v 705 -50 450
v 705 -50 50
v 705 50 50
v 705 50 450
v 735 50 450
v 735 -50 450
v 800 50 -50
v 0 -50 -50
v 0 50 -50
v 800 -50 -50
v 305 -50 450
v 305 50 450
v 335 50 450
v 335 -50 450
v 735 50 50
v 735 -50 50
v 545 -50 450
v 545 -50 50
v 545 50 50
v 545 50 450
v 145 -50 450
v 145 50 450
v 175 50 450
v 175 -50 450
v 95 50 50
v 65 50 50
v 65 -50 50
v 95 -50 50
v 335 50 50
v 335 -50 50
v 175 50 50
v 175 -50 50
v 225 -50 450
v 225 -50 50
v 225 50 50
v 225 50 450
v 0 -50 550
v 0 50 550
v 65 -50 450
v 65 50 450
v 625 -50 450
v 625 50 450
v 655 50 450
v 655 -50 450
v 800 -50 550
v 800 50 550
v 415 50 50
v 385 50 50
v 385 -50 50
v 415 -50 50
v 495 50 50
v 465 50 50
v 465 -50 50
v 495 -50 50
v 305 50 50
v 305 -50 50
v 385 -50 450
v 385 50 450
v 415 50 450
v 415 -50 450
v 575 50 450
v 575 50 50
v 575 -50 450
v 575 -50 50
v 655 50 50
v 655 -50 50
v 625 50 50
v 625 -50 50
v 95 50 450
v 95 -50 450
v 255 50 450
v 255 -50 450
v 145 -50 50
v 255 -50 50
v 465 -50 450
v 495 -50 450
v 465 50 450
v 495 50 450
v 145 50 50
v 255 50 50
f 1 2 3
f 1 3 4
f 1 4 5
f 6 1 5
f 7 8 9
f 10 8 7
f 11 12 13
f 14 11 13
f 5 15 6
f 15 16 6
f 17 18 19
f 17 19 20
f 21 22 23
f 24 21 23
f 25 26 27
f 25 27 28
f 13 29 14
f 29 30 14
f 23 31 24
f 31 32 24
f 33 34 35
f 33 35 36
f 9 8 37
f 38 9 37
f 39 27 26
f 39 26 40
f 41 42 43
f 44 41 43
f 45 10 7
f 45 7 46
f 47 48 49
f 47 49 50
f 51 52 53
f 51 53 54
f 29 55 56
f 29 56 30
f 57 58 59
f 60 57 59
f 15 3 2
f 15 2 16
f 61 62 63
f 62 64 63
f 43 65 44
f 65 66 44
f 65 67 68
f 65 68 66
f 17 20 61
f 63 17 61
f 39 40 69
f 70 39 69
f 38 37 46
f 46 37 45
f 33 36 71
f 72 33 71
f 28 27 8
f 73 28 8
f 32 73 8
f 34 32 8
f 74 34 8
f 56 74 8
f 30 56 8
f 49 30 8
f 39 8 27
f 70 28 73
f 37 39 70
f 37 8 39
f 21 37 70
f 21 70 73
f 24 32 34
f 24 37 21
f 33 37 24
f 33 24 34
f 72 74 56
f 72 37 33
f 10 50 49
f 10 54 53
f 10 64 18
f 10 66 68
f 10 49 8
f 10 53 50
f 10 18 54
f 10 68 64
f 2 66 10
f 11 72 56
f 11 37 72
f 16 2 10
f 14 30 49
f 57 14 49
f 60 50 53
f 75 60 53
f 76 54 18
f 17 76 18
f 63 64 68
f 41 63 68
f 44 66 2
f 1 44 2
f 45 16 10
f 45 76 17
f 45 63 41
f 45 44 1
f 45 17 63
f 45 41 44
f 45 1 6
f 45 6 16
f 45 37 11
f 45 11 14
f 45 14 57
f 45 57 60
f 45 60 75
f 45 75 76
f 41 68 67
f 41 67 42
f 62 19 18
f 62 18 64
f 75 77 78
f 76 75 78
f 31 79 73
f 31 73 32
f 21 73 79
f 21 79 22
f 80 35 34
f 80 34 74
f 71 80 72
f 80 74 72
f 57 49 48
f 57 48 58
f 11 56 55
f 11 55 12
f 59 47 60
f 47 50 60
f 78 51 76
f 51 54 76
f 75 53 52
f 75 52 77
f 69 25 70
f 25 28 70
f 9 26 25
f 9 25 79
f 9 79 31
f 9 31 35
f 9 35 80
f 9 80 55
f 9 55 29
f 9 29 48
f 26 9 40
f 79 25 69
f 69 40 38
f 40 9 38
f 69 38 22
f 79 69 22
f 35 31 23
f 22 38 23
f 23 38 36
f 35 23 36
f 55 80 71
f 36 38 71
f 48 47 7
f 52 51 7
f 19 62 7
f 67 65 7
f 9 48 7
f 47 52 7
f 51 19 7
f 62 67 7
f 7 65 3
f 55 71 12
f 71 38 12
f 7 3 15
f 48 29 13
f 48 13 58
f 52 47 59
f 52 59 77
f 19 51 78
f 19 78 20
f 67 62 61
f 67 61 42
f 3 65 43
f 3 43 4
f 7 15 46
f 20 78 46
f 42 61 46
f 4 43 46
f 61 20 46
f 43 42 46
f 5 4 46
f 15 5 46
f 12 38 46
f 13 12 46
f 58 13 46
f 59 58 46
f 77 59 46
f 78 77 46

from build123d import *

# Parameters (mm, degrees)
F0_W     = 800
F0_H     = 600
F0_W_2   = 30
F0_H_2   = 400
F1_DEPTH = 50


with BuildPart() as f1:
    # F0 (on Front) → F1 (new body, symmetric)
    with BuildSketch(Plane.XZ):
        with Locations((400, 250)):
            Rectangle(F0_W, F0_H)
        with Locations((80, 250)):
            Rectangle(F0_W_2, F0_H_2, mode=Mode.SUBTRACT)
        with Locations((160, 250)):
            Rectangle(F0_W_2, F0_H_2, mode=Mode.SUBTRACT)
        with Locations((240, 250)):
            Rectangle(F0_W_2, F0_H_2, mode=Mode.SUBTRACT)
        with Locations((320, 250)):
            Rectangle(F0_W_2, F0_H_2, mode=Mode.SUBTRACT)
        with Locations((400, 250)):
            Rectangle(F0_W_2, F0_H_2, mode=Mode.SUBTRACT)
        with Locations((480, 250)):
            Rectangle(F0_W_2, F0_H_2, mode=Mode.SUBTRACT)
        with Locations((560, 250)):
            Rectangle(F0_W_2, F0_H_2, mode=Mode.SUBTRACT)
        with Locations((640, 250)):
            Rectangle(F0_W_2, F0_H_2, mode=Mode.SUBTRACT)
        with Locations((720, 250)):
            Rectangle(F0_W_2, F0_H_2, mode=Mode.SUBTRACT)
    extrude(amount=F1_DEPTH, both=True)


solid = f1.part
